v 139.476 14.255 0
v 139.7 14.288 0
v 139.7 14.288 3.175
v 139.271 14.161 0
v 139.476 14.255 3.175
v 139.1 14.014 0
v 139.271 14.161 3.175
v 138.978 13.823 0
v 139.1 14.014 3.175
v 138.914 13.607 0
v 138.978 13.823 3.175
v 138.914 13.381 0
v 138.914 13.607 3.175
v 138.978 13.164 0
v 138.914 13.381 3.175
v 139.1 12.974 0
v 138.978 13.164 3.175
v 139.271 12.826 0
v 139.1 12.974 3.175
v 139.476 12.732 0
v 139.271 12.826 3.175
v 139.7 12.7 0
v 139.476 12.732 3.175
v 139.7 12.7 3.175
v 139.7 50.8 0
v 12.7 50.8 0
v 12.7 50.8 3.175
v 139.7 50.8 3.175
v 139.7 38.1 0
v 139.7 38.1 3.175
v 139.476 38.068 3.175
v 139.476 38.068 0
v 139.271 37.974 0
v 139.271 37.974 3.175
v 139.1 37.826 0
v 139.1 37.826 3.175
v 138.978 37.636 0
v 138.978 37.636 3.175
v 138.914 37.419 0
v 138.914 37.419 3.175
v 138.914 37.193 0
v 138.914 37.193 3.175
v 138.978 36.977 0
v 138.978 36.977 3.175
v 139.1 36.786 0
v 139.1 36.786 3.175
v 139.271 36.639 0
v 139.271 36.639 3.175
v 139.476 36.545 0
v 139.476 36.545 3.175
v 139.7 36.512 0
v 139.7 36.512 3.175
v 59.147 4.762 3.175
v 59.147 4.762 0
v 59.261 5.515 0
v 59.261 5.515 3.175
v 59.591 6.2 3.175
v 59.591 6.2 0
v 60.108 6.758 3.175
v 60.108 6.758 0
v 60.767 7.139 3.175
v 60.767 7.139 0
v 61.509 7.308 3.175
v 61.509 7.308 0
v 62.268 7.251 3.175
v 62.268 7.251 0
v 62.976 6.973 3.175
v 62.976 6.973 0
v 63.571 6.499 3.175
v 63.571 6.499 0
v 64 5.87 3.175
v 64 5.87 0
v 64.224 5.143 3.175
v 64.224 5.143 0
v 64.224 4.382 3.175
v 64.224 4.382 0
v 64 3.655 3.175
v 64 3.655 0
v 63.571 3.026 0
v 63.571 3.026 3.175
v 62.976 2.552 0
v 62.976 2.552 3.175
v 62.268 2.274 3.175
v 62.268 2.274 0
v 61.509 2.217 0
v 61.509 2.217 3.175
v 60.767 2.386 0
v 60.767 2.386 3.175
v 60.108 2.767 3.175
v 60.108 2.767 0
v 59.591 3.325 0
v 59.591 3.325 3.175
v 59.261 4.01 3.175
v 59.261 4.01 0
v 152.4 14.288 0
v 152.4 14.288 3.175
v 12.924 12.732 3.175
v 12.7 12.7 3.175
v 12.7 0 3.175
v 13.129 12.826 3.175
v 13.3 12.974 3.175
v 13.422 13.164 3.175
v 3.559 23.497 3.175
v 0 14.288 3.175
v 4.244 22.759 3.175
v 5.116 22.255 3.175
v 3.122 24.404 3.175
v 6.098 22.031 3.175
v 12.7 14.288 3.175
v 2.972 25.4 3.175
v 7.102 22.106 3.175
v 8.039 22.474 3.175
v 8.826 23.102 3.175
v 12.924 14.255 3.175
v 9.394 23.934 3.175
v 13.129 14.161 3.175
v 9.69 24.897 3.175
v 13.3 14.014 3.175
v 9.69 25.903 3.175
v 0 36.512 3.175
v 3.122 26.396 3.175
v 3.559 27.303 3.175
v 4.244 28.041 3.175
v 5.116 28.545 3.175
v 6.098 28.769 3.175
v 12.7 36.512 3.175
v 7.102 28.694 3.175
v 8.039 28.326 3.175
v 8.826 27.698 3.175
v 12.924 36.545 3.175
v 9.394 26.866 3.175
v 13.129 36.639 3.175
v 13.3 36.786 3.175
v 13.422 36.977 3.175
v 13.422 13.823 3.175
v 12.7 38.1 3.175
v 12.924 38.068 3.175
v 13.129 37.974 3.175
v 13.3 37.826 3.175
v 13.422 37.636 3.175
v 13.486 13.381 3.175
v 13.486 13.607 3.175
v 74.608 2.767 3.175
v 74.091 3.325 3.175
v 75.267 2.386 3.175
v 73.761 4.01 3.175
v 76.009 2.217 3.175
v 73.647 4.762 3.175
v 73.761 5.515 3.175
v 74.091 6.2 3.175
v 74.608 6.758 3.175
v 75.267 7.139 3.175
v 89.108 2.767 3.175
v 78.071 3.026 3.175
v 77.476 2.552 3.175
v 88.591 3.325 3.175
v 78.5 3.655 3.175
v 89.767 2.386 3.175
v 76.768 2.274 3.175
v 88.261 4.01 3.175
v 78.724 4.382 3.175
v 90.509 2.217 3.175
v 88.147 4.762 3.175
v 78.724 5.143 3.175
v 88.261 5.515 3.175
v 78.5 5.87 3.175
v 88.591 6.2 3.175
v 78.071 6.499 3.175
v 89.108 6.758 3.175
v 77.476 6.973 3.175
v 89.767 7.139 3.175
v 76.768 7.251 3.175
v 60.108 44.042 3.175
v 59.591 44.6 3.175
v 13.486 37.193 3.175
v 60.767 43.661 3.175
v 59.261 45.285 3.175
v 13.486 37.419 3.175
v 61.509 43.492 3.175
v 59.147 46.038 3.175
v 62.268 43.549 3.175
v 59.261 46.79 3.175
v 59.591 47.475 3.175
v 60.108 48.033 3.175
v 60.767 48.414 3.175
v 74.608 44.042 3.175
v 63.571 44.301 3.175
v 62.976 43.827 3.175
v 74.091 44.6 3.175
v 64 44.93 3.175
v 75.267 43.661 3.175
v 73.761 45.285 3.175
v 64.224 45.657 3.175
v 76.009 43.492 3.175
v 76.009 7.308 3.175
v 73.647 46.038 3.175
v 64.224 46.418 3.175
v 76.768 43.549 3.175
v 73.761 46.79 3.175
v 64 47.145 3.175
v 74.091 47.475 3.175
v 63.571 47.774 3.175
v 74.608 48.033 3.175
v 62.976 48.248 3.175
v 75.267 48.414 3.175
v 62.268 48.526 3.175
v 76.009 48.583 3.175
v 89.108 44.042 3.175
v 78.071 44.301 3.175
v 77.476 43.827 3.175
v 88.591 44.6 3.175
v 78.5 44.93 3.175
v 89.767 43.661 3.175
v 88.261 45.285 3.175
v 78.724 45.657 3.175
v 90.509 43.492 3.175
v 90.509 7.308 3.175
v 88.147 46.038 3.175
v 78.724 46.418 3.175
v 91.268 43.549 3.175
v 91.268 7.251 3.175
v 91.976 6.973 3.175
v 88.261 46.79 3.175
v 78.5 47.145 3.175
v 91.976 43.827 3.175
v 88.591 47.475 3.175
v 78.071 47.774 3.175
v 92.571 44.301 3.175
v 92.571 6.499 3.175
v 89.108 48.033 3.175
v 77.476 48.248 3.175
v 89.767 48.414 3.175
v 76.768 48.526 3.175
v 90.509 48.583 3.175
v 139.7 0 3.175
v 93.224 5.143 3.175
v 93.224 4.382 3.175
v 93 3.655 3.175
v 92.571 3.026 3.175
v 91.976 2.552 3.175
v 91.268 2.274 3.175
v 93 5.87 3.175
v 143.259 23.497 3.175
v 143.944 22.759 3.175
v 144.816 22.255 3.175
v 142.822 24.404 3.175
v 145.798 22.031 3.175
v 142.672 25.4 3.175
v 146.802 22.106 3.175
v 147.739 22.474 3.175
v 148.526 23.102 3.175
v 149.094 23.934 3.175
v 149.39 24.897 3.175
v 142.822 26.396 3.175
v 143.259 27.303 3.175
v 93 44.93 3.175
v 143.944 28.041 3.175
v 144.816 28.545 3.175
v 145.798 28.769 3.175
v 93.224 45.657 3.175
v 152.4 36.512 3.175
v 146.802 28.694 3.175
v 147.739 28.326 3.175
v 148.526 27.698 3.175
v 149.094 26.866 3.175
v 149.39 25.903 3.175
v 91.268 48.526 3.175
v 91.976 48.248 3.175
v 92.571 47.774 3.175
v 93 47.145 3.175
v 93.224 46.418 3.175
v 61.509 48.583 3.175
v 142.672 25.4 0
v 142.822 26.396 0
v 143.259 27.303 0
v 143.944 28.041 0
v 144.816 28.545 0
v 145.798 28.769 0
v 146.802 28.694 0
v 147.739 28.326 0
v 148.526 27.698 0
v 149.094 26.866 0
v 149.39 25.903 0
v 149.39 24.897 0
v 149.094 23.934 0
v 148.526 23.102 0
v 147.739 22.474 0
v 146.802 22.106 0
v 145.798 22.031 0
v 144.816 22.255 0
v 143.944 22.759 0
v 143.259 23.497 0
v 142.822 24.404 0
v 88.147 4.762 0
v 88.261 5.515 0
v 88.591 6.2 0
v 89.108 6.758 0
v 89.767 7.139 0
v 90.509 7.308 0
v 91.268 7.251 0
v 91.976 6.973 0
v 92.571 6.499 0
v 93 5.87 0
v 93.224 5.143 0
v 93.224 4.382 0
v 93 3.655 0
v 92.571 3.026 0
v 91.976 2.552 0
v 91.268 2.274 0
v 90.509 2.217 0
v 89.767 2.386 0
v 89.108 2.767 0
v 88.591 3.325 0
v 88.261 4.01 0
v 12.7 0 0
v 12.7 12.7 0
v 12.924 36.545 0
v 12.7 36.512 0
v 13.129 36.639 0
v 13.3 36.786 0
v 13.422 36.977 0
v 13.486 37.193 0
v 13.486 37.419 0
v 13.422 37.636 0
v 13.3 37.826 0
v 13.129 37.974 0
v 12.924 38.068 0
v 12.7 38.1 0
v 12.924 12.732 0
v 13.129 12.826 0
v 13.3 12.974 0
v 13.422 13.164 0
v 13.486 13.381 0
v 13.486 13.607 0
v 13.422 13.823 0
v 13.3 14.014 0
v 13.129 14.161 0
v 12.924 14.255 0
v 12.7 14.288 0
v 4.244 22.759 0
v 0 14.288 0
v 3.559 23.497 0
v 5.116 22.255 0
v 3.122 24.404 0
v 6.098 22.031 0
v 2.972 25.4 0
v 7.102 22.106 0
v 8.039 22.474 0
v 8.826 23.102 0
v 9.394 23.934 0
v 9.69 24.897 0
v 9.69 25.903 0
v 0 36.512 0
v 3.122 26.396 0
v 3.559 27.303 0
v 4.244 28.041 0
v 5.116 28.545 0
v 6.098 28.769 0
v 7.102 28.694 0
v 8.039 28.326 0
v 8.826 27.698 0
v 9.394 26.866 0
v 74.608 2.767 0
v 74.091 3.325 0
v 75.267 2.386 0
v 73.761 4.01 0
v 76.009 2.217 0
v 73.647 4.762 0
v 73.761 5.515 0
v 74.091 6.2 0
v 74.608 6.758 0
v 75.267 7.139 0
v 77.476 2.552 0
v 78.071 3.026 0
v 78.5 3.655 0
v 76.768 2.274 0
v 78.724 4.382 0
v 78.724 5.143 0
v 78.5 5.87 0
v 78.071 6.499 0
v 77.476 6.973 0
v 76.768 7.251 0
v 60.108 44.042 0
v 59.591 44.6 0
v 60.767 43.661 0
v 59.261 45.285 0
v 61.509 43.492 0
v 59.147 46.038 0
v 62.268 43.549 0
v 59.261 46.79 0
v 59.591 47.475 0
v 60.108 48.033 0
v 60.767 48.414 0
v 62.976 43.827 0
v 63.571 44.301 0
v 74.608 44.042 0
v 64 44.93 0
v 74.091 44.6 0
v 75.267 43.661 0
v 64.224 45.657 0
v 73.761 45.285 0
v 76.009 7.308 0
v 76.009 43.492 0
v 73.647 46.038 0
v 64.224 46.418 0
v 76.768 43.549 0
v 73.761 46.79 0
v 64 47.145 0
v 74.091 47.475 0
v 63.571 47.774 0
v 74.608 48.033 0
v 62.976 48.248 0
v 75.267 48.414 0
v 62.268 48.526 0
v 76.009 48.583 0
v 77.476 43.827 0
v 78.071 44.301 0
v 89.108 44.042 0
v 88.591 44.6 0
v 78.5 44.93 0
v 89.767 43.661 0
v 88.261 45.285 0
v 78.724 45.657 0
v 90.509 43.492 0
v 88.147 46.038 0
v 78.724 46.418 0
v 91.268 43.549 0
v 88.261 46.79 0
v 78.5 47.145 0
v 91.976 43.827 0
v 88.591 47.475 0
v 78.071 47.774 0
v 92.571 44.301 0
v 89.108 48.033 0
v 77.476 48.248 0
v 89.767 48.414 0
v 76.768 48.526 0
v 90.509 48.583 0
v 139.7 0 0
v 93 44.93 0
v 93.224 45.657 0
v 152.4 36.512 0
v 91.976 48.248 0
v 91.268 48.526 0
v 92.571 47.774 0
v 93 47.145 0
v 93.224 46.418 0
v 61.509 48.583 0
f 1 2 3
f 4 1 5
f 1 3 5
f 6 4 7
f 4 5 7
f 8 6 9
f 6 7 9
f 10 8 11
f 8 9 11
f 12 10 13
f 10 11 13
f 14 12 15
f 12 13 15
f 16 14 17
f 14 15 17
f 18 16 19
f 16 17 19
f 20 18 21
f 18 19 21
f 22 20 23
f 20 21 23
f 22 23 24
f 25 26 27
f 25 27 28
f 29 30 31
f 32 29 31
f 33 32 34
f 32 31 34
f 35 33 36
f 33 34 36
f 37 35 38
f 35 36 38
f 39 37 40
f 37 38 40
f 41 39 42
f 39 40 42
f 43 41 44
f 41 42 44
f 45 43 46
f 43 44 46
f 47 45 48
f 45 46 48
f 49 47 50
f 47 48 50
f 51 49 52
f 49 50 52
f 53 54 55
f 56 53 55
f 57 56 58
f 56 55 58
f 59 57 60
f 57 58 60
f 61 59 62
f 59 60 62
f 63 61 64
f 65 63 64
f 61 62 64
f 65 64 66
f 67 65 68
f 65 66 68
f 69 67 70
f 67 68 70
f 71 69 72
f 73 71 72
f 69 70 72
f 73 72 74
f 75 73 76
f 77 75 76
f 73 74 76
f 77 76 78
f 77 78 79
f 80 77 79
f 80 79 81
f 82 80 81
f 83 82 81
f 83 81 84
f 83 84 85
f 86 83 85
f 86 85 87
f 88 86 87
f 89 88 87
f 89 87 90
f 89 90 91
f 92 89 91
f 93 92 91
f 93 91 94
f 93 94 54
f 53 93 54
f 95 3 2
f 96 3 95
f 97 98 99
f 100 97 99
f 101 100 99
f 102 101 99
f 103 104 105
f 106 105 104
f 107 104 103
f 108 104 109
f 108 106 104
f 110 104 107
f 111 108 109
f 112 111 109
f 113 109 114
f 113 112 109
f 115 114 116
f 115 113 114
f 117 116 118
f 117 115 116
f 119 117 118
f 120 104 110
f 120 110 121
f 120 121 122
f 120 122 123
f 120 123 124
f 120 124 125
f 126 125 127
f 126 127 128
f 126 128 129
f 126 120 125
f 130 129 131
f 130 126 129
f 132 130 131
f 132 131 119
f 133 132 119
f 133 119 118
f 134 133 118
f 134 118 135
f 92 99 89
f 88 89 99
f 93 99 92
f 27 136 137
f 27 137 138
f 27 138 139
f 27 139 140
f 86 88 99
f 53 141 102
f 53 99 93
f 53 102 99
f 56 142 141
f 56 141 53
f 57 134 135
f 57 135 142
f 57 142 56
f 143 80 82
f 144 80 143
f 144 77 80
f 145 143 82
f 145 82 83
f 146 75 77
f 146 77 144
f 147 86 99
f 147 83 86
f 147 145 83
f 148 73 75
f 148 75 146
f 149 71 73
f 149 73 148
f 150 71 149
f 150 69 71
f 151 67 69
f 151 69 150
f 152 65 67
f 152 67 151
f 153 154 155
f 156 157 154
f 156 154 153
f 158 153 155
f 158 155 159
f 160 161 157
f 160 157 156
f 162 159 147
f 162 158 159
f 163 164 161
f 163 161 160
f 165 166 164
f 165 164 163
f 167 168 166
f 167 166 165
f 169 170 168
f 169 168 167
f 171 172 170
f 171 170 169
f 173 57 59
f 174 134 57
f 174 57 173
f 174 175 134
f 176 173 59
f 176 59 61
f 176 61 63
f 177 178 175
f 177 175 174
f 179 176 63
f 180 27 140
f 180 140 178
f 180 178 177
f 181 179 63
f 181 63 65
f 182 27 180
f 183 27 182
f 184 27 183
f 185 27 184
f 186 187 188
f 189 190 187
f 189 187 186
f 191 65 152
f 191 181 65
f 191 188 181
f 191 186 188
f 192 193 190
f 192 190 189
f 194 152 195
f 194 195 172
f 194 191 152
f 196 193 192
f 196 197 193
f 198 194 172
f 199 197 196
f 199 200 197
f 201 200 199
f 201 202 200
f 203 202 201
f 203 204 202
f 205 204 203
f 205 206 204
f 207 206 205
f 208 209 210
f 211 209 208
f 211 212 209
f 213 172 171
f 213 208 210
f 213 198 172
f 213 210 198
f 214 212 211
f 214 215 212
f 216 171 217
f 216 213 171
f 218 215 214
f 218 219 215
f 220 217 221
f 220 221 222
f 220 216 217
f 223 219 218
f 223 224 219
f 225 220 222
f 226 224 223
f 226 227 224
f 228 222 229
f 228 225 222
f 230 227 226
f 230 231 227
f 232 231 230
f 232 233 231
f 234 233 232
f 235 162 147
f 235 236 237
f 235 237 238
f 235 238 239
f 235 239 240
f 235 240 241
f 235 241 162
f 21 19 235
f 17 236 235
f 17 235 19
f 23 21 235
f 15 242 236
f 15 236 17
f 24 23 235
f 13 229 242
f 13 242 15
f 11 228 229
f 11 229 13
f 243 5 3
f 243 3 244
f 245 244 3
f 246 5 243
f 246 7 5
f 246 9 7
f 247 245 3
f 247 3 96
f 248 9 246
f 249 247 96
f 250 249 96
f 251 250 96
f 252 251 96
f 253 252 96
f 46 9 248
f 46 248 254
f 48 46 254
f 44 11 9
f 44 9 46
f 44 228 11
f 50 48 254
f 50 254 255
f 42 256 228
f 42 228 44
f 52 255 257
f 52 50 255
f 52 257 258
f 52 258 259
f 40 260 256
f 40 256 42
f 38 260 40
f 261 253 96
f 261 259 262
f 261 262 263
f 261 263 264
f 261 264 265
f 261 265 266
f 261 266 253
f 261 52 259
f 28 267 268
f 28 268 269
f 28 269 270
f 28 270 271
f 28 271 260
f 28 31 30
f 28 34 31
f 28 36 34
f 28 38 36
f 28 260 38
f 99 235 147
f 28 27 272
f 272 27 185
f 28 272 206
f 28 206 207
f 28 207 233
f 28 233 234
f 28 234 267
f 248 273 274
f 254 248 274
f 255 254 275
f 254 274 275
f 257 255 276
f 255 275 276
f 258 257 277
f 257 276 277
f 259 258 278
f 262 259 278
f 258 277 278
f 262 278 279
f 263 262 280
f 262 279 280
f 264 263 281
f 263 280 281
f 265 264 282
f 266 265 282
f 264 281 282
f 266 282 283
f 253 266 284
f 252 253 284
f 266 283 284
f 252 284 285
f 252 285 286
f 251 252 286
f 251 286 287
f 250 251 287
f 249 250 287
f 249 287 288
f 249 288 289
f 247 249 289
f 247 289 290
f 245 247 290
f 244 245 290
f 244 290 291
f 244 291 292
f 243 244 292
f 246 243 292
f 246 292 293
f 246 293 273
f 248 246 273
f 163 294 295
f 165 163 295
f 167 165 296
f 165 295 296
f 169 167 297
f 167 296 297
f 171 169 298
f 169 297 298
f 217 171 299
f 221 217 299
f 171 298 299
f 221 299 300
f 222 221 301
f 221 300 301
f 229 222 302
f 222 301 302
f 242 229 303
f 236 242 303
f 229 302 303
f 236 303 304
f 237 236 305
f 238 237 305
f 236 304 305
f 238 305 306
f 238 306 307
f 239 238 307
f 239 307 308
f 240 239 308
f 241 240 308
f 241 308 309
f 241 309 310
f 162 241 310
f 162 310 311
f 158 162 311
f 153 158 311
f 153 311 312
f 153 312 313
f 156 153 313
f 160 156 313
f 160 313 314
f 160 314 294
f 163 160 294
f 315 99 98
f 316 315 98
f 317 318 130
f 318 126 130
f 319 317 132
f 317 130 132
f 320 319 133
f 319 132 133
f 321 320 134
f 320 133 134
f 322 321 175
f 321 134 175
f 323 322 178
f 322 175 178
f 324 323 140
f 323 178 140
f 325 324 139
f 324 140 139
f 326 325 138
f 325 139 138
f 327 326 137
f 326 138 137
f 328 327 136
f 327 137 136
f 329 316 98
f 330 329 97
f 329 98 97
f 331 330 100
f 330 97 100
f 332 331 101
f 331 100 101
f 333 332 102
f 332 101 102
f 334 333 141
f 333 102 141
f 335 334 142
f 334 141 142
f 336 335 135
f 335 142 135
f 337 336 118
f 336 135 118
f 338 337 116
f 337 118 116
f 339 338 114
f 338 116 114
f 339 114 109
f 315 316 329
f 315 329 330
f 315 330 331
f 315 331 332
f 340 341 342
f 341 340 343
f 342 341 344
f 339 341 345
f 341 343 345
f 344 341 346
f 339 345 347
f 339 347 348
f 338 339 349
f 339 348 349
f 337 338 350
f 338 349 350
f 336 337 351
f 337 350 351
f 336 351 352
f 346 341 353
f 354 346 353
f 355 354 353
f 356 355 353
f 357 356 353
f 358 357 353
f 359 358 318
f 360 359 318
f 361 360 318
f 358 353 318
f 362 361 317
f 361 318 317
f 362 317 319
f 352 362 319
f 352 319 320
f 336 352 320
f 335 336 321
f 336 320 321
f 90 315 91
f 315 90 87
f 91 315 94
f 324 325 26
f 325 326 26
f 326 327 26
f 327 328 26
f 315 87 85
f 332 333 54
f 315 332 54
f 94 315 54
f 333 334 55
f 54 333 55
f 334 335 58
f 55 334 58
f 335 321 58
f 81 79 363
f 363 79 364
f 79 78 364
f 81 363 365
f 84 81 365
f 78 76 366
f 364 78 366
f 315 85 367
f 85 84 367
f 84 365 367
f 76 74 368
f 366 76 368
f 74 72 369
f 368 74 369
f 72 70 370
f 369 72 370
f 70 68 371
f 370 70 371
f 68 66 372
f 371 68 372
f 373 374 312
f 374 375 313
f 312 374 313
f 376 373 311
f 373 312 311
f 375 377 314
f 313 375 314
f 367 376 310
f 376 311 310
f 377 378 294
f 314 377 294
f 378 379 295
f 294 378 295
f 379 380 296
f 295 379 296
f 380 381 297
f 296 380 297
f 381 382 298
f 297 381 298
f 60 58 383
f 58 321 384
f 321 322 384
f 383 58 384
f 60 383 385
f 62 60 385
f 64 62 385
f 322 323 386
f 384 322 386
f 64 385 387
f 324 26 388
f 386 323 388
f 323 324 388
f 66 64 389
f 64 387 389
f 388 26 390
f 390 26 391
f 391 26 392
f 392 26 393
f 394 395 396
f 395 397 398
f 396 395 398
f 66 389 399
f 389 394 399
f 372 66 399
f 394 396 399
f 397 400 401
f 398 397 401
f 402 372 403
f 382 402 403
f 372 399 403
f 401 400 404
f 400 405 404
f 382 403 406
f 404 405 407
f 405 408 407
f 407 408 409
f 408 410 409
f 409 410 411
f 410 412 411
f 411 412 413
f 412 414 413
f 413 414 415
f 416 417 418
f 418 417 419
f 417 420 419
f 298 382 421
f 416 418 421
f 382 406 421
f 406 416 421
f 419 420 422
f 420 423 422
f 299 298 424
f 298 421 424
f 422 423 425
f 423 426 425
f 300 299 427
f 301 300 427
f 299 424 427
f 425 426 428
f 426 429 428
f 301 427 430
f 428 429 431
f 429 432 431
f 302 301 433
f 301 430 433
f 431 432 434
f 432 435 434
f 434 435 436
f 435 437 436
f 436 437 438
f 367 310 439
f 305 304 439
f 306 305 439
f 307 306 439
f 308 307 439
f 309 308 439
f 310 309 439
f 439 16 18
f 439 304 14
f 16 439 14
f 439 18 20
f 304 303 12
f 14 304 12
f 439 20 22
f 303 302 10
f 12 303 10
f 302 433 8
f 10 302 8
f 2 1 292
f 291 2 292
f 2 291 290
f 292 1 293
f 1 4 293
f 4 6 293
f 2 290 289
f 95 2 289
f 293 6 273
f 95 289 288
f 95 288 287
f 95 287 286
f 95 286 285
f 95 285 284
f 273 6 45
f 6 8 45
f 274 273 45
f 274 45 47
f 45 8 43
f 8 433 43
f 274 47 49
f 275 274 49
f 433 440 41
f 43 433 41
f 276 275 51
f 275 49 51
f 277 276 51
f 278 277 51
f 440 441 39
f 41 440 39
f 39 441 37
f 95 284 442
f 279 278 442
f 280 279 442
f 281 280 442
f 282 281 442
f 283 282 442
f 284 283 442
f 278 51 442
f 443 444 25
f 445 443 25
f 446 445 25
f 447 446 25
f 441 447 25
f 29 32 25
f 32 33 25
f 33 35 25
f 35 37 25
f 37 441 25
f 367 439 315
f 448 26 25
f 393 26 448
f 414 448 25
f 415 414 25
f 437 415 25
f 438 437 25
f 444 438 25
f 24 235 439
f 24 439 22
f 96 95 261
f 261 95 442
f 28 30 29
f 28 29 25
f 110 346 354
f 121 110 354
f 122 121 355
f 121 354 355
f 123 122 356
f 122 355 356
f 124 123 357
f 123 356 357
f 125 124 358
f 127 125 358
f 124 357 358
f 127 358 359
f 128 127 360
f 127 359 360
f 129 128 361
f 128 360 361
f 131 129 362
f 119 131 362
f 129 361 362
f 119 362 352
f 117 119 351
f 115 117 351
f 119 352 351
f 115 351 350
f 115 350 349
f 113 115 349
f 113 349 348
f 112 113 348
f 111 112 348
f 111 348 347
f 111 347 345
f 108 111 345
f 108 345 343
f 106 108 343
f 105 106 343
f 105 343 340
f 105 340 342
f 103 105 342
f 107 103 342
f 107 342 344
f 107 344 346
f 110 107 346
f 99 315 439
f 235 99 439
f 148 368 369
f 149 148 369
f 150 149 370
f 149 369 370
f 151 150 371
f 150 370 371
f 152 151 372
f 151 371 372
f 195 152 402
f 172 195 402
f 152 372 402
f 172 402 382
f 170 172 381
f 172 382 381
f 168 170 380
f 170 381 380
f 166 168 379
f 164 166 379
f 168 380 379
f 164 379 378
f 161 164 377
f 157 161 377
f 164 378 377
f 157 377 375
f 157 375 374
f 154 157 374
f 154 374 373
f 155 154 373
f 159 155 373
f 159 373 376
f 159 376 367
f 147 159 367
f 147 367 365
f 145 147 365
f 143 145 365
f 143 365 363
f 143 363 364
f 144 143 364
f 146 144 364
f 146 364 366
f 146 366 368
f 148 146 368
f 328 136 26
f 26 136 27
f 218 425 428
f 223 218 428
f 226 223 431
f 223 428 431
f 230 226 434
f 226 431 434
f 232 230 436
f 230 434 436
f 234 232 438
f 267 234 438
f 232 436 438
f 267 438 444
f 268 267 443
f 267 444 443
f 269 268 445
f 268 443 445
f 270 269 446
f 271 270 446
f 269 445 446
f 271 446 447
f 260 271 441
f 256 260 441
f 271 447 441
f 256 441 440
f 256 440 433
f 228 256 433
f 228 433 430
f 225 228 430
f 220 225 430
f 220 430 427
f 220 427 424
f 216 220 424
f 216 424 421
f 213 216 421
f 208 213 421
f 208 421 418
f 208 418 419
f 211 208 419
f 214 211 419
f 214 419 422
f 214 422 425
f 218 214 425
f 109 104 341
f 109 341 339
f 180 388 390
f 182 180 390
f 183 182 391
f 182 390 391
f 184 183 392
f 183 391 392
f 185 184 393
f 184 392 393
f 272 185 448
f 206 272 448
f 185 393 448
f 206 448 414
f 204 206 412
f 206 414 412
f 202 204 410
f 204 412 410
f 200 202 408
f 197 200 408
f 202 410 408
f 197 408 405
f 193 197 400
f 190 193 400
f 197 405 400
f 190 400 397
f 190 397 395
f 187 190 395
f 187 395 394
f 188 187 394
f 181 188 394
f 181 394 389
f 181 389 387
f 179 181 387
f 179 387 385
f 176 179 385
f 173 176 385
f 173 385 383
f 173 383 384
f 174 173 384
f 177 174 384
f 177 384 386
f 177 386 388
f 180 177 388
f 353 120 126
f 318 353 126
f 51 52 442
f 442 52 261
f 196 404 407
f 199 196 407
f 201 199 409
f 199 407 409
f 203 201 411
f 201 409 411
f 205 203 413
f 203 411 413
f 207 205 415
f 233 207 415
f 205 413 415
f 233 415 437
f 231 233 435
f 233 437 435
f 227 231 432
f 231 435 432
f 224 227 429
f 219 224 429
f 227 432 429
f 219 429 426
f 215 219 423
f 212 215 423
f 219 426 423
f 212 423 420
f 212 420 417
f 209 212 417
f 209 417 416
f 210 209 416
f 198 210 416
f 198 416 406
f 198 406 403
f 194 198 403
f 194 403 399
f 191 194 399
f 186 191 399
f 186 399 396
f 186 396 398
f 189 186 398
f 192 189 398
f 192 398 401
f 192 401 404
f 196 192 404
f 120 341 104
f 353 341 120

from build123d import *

# Parameters (mm, degrees)
SKETCH1_W               = 152.4
SKETCH1_H               = 50.8
BOSS_EXTRUDE1_DEPTH     = 3.175
SKETCH2_W               = 12.7
SKETCH2_H               = 14.2875
CUT_EXTRUDE1_DEPTH      = 4.175
SKETCH3_R               = 0.79375
CUT_EXTRUDE2_DEPTH      = 4.175
F_1_4_CLEARANCE_HOLE1_D = 6.7564
F_10_CLEARANCE_HOLE1_D  = 5.1054


with BuildPart() as part:
    # Sketch1 → Boss-Extrude1 (new body)
    with BuildSketch(Plane.XY):
        with Locations((76.2, 25.4)):
            Rectangle(SKETCH1_W, SKETCH1_H)
    extrude(amount=BOSS_EXTRUDE1_DEPTH)

    # Sketch2 → Cut-Extrude1 (cut, through all)
    with BuildSketch(Plane.XY.offset(3.175)):
        with Locations((6.35, 43.65625)):
            Rectangle(SKETCH2_W, SKETCH2_H)
        with Locations((6.35, 7.14375)):
            Rectangle(SKETCH2_W, SKETCH2_H)
        with Locations((146.05, 7.14375)):
            Rectangle(SKETCH2_W, SKETCH2_H)
        with Locations((146.05, 43.65625)):
            Rectangle(SKETCH2_W, SKETCH2_H)
    extrude(amount=-CUT_EXTRUDE1_DEPTH, mode=Mode.SUBTRACT)

    # Sketch3 → Cut-Extrude2 (cut, through all)
    with BuildSketch(Plane.XY.offset(3.175)):
        with Locations((12.7, 37.30625)):
            Circle(SKETCH3_R)
        with Locations((12.7, 13.49375)):
            Circle(SKETCH3_R)
        with Locations((139.7, 13.49375)):
            Circle(SKETCH3_R)
        with Locations((139.7, 37.30625)):
            Circle(SKETCH3_R)
    extrude(amount=-CUT_EXTRUDE2_DEPTH, mode=Mode.SUBTRACT)

    # 1/4 Clearance Hole1 (through all)
    with Locations(Plane.XY.offset(3.175)):
        with Locations((6.35, 25.4), (146.05, 25.4)):
            Hole(F_1_4_CLEARANCE_HOLE1_D / 2)

    # #10 Clearance Hole1 (through all)
    with Locations(Plane.XY.offset(3.175)):
        with Locations((76.2, 4.7625), (90.7, 4.7625), (61.7, 4.7625), (61.7, 46.0375), (76.2, 46.0375), (90.7, 46.0375)):
            Hole(F_10_CLEARANCE_HOLE1_D / 2)


solid = part.part
